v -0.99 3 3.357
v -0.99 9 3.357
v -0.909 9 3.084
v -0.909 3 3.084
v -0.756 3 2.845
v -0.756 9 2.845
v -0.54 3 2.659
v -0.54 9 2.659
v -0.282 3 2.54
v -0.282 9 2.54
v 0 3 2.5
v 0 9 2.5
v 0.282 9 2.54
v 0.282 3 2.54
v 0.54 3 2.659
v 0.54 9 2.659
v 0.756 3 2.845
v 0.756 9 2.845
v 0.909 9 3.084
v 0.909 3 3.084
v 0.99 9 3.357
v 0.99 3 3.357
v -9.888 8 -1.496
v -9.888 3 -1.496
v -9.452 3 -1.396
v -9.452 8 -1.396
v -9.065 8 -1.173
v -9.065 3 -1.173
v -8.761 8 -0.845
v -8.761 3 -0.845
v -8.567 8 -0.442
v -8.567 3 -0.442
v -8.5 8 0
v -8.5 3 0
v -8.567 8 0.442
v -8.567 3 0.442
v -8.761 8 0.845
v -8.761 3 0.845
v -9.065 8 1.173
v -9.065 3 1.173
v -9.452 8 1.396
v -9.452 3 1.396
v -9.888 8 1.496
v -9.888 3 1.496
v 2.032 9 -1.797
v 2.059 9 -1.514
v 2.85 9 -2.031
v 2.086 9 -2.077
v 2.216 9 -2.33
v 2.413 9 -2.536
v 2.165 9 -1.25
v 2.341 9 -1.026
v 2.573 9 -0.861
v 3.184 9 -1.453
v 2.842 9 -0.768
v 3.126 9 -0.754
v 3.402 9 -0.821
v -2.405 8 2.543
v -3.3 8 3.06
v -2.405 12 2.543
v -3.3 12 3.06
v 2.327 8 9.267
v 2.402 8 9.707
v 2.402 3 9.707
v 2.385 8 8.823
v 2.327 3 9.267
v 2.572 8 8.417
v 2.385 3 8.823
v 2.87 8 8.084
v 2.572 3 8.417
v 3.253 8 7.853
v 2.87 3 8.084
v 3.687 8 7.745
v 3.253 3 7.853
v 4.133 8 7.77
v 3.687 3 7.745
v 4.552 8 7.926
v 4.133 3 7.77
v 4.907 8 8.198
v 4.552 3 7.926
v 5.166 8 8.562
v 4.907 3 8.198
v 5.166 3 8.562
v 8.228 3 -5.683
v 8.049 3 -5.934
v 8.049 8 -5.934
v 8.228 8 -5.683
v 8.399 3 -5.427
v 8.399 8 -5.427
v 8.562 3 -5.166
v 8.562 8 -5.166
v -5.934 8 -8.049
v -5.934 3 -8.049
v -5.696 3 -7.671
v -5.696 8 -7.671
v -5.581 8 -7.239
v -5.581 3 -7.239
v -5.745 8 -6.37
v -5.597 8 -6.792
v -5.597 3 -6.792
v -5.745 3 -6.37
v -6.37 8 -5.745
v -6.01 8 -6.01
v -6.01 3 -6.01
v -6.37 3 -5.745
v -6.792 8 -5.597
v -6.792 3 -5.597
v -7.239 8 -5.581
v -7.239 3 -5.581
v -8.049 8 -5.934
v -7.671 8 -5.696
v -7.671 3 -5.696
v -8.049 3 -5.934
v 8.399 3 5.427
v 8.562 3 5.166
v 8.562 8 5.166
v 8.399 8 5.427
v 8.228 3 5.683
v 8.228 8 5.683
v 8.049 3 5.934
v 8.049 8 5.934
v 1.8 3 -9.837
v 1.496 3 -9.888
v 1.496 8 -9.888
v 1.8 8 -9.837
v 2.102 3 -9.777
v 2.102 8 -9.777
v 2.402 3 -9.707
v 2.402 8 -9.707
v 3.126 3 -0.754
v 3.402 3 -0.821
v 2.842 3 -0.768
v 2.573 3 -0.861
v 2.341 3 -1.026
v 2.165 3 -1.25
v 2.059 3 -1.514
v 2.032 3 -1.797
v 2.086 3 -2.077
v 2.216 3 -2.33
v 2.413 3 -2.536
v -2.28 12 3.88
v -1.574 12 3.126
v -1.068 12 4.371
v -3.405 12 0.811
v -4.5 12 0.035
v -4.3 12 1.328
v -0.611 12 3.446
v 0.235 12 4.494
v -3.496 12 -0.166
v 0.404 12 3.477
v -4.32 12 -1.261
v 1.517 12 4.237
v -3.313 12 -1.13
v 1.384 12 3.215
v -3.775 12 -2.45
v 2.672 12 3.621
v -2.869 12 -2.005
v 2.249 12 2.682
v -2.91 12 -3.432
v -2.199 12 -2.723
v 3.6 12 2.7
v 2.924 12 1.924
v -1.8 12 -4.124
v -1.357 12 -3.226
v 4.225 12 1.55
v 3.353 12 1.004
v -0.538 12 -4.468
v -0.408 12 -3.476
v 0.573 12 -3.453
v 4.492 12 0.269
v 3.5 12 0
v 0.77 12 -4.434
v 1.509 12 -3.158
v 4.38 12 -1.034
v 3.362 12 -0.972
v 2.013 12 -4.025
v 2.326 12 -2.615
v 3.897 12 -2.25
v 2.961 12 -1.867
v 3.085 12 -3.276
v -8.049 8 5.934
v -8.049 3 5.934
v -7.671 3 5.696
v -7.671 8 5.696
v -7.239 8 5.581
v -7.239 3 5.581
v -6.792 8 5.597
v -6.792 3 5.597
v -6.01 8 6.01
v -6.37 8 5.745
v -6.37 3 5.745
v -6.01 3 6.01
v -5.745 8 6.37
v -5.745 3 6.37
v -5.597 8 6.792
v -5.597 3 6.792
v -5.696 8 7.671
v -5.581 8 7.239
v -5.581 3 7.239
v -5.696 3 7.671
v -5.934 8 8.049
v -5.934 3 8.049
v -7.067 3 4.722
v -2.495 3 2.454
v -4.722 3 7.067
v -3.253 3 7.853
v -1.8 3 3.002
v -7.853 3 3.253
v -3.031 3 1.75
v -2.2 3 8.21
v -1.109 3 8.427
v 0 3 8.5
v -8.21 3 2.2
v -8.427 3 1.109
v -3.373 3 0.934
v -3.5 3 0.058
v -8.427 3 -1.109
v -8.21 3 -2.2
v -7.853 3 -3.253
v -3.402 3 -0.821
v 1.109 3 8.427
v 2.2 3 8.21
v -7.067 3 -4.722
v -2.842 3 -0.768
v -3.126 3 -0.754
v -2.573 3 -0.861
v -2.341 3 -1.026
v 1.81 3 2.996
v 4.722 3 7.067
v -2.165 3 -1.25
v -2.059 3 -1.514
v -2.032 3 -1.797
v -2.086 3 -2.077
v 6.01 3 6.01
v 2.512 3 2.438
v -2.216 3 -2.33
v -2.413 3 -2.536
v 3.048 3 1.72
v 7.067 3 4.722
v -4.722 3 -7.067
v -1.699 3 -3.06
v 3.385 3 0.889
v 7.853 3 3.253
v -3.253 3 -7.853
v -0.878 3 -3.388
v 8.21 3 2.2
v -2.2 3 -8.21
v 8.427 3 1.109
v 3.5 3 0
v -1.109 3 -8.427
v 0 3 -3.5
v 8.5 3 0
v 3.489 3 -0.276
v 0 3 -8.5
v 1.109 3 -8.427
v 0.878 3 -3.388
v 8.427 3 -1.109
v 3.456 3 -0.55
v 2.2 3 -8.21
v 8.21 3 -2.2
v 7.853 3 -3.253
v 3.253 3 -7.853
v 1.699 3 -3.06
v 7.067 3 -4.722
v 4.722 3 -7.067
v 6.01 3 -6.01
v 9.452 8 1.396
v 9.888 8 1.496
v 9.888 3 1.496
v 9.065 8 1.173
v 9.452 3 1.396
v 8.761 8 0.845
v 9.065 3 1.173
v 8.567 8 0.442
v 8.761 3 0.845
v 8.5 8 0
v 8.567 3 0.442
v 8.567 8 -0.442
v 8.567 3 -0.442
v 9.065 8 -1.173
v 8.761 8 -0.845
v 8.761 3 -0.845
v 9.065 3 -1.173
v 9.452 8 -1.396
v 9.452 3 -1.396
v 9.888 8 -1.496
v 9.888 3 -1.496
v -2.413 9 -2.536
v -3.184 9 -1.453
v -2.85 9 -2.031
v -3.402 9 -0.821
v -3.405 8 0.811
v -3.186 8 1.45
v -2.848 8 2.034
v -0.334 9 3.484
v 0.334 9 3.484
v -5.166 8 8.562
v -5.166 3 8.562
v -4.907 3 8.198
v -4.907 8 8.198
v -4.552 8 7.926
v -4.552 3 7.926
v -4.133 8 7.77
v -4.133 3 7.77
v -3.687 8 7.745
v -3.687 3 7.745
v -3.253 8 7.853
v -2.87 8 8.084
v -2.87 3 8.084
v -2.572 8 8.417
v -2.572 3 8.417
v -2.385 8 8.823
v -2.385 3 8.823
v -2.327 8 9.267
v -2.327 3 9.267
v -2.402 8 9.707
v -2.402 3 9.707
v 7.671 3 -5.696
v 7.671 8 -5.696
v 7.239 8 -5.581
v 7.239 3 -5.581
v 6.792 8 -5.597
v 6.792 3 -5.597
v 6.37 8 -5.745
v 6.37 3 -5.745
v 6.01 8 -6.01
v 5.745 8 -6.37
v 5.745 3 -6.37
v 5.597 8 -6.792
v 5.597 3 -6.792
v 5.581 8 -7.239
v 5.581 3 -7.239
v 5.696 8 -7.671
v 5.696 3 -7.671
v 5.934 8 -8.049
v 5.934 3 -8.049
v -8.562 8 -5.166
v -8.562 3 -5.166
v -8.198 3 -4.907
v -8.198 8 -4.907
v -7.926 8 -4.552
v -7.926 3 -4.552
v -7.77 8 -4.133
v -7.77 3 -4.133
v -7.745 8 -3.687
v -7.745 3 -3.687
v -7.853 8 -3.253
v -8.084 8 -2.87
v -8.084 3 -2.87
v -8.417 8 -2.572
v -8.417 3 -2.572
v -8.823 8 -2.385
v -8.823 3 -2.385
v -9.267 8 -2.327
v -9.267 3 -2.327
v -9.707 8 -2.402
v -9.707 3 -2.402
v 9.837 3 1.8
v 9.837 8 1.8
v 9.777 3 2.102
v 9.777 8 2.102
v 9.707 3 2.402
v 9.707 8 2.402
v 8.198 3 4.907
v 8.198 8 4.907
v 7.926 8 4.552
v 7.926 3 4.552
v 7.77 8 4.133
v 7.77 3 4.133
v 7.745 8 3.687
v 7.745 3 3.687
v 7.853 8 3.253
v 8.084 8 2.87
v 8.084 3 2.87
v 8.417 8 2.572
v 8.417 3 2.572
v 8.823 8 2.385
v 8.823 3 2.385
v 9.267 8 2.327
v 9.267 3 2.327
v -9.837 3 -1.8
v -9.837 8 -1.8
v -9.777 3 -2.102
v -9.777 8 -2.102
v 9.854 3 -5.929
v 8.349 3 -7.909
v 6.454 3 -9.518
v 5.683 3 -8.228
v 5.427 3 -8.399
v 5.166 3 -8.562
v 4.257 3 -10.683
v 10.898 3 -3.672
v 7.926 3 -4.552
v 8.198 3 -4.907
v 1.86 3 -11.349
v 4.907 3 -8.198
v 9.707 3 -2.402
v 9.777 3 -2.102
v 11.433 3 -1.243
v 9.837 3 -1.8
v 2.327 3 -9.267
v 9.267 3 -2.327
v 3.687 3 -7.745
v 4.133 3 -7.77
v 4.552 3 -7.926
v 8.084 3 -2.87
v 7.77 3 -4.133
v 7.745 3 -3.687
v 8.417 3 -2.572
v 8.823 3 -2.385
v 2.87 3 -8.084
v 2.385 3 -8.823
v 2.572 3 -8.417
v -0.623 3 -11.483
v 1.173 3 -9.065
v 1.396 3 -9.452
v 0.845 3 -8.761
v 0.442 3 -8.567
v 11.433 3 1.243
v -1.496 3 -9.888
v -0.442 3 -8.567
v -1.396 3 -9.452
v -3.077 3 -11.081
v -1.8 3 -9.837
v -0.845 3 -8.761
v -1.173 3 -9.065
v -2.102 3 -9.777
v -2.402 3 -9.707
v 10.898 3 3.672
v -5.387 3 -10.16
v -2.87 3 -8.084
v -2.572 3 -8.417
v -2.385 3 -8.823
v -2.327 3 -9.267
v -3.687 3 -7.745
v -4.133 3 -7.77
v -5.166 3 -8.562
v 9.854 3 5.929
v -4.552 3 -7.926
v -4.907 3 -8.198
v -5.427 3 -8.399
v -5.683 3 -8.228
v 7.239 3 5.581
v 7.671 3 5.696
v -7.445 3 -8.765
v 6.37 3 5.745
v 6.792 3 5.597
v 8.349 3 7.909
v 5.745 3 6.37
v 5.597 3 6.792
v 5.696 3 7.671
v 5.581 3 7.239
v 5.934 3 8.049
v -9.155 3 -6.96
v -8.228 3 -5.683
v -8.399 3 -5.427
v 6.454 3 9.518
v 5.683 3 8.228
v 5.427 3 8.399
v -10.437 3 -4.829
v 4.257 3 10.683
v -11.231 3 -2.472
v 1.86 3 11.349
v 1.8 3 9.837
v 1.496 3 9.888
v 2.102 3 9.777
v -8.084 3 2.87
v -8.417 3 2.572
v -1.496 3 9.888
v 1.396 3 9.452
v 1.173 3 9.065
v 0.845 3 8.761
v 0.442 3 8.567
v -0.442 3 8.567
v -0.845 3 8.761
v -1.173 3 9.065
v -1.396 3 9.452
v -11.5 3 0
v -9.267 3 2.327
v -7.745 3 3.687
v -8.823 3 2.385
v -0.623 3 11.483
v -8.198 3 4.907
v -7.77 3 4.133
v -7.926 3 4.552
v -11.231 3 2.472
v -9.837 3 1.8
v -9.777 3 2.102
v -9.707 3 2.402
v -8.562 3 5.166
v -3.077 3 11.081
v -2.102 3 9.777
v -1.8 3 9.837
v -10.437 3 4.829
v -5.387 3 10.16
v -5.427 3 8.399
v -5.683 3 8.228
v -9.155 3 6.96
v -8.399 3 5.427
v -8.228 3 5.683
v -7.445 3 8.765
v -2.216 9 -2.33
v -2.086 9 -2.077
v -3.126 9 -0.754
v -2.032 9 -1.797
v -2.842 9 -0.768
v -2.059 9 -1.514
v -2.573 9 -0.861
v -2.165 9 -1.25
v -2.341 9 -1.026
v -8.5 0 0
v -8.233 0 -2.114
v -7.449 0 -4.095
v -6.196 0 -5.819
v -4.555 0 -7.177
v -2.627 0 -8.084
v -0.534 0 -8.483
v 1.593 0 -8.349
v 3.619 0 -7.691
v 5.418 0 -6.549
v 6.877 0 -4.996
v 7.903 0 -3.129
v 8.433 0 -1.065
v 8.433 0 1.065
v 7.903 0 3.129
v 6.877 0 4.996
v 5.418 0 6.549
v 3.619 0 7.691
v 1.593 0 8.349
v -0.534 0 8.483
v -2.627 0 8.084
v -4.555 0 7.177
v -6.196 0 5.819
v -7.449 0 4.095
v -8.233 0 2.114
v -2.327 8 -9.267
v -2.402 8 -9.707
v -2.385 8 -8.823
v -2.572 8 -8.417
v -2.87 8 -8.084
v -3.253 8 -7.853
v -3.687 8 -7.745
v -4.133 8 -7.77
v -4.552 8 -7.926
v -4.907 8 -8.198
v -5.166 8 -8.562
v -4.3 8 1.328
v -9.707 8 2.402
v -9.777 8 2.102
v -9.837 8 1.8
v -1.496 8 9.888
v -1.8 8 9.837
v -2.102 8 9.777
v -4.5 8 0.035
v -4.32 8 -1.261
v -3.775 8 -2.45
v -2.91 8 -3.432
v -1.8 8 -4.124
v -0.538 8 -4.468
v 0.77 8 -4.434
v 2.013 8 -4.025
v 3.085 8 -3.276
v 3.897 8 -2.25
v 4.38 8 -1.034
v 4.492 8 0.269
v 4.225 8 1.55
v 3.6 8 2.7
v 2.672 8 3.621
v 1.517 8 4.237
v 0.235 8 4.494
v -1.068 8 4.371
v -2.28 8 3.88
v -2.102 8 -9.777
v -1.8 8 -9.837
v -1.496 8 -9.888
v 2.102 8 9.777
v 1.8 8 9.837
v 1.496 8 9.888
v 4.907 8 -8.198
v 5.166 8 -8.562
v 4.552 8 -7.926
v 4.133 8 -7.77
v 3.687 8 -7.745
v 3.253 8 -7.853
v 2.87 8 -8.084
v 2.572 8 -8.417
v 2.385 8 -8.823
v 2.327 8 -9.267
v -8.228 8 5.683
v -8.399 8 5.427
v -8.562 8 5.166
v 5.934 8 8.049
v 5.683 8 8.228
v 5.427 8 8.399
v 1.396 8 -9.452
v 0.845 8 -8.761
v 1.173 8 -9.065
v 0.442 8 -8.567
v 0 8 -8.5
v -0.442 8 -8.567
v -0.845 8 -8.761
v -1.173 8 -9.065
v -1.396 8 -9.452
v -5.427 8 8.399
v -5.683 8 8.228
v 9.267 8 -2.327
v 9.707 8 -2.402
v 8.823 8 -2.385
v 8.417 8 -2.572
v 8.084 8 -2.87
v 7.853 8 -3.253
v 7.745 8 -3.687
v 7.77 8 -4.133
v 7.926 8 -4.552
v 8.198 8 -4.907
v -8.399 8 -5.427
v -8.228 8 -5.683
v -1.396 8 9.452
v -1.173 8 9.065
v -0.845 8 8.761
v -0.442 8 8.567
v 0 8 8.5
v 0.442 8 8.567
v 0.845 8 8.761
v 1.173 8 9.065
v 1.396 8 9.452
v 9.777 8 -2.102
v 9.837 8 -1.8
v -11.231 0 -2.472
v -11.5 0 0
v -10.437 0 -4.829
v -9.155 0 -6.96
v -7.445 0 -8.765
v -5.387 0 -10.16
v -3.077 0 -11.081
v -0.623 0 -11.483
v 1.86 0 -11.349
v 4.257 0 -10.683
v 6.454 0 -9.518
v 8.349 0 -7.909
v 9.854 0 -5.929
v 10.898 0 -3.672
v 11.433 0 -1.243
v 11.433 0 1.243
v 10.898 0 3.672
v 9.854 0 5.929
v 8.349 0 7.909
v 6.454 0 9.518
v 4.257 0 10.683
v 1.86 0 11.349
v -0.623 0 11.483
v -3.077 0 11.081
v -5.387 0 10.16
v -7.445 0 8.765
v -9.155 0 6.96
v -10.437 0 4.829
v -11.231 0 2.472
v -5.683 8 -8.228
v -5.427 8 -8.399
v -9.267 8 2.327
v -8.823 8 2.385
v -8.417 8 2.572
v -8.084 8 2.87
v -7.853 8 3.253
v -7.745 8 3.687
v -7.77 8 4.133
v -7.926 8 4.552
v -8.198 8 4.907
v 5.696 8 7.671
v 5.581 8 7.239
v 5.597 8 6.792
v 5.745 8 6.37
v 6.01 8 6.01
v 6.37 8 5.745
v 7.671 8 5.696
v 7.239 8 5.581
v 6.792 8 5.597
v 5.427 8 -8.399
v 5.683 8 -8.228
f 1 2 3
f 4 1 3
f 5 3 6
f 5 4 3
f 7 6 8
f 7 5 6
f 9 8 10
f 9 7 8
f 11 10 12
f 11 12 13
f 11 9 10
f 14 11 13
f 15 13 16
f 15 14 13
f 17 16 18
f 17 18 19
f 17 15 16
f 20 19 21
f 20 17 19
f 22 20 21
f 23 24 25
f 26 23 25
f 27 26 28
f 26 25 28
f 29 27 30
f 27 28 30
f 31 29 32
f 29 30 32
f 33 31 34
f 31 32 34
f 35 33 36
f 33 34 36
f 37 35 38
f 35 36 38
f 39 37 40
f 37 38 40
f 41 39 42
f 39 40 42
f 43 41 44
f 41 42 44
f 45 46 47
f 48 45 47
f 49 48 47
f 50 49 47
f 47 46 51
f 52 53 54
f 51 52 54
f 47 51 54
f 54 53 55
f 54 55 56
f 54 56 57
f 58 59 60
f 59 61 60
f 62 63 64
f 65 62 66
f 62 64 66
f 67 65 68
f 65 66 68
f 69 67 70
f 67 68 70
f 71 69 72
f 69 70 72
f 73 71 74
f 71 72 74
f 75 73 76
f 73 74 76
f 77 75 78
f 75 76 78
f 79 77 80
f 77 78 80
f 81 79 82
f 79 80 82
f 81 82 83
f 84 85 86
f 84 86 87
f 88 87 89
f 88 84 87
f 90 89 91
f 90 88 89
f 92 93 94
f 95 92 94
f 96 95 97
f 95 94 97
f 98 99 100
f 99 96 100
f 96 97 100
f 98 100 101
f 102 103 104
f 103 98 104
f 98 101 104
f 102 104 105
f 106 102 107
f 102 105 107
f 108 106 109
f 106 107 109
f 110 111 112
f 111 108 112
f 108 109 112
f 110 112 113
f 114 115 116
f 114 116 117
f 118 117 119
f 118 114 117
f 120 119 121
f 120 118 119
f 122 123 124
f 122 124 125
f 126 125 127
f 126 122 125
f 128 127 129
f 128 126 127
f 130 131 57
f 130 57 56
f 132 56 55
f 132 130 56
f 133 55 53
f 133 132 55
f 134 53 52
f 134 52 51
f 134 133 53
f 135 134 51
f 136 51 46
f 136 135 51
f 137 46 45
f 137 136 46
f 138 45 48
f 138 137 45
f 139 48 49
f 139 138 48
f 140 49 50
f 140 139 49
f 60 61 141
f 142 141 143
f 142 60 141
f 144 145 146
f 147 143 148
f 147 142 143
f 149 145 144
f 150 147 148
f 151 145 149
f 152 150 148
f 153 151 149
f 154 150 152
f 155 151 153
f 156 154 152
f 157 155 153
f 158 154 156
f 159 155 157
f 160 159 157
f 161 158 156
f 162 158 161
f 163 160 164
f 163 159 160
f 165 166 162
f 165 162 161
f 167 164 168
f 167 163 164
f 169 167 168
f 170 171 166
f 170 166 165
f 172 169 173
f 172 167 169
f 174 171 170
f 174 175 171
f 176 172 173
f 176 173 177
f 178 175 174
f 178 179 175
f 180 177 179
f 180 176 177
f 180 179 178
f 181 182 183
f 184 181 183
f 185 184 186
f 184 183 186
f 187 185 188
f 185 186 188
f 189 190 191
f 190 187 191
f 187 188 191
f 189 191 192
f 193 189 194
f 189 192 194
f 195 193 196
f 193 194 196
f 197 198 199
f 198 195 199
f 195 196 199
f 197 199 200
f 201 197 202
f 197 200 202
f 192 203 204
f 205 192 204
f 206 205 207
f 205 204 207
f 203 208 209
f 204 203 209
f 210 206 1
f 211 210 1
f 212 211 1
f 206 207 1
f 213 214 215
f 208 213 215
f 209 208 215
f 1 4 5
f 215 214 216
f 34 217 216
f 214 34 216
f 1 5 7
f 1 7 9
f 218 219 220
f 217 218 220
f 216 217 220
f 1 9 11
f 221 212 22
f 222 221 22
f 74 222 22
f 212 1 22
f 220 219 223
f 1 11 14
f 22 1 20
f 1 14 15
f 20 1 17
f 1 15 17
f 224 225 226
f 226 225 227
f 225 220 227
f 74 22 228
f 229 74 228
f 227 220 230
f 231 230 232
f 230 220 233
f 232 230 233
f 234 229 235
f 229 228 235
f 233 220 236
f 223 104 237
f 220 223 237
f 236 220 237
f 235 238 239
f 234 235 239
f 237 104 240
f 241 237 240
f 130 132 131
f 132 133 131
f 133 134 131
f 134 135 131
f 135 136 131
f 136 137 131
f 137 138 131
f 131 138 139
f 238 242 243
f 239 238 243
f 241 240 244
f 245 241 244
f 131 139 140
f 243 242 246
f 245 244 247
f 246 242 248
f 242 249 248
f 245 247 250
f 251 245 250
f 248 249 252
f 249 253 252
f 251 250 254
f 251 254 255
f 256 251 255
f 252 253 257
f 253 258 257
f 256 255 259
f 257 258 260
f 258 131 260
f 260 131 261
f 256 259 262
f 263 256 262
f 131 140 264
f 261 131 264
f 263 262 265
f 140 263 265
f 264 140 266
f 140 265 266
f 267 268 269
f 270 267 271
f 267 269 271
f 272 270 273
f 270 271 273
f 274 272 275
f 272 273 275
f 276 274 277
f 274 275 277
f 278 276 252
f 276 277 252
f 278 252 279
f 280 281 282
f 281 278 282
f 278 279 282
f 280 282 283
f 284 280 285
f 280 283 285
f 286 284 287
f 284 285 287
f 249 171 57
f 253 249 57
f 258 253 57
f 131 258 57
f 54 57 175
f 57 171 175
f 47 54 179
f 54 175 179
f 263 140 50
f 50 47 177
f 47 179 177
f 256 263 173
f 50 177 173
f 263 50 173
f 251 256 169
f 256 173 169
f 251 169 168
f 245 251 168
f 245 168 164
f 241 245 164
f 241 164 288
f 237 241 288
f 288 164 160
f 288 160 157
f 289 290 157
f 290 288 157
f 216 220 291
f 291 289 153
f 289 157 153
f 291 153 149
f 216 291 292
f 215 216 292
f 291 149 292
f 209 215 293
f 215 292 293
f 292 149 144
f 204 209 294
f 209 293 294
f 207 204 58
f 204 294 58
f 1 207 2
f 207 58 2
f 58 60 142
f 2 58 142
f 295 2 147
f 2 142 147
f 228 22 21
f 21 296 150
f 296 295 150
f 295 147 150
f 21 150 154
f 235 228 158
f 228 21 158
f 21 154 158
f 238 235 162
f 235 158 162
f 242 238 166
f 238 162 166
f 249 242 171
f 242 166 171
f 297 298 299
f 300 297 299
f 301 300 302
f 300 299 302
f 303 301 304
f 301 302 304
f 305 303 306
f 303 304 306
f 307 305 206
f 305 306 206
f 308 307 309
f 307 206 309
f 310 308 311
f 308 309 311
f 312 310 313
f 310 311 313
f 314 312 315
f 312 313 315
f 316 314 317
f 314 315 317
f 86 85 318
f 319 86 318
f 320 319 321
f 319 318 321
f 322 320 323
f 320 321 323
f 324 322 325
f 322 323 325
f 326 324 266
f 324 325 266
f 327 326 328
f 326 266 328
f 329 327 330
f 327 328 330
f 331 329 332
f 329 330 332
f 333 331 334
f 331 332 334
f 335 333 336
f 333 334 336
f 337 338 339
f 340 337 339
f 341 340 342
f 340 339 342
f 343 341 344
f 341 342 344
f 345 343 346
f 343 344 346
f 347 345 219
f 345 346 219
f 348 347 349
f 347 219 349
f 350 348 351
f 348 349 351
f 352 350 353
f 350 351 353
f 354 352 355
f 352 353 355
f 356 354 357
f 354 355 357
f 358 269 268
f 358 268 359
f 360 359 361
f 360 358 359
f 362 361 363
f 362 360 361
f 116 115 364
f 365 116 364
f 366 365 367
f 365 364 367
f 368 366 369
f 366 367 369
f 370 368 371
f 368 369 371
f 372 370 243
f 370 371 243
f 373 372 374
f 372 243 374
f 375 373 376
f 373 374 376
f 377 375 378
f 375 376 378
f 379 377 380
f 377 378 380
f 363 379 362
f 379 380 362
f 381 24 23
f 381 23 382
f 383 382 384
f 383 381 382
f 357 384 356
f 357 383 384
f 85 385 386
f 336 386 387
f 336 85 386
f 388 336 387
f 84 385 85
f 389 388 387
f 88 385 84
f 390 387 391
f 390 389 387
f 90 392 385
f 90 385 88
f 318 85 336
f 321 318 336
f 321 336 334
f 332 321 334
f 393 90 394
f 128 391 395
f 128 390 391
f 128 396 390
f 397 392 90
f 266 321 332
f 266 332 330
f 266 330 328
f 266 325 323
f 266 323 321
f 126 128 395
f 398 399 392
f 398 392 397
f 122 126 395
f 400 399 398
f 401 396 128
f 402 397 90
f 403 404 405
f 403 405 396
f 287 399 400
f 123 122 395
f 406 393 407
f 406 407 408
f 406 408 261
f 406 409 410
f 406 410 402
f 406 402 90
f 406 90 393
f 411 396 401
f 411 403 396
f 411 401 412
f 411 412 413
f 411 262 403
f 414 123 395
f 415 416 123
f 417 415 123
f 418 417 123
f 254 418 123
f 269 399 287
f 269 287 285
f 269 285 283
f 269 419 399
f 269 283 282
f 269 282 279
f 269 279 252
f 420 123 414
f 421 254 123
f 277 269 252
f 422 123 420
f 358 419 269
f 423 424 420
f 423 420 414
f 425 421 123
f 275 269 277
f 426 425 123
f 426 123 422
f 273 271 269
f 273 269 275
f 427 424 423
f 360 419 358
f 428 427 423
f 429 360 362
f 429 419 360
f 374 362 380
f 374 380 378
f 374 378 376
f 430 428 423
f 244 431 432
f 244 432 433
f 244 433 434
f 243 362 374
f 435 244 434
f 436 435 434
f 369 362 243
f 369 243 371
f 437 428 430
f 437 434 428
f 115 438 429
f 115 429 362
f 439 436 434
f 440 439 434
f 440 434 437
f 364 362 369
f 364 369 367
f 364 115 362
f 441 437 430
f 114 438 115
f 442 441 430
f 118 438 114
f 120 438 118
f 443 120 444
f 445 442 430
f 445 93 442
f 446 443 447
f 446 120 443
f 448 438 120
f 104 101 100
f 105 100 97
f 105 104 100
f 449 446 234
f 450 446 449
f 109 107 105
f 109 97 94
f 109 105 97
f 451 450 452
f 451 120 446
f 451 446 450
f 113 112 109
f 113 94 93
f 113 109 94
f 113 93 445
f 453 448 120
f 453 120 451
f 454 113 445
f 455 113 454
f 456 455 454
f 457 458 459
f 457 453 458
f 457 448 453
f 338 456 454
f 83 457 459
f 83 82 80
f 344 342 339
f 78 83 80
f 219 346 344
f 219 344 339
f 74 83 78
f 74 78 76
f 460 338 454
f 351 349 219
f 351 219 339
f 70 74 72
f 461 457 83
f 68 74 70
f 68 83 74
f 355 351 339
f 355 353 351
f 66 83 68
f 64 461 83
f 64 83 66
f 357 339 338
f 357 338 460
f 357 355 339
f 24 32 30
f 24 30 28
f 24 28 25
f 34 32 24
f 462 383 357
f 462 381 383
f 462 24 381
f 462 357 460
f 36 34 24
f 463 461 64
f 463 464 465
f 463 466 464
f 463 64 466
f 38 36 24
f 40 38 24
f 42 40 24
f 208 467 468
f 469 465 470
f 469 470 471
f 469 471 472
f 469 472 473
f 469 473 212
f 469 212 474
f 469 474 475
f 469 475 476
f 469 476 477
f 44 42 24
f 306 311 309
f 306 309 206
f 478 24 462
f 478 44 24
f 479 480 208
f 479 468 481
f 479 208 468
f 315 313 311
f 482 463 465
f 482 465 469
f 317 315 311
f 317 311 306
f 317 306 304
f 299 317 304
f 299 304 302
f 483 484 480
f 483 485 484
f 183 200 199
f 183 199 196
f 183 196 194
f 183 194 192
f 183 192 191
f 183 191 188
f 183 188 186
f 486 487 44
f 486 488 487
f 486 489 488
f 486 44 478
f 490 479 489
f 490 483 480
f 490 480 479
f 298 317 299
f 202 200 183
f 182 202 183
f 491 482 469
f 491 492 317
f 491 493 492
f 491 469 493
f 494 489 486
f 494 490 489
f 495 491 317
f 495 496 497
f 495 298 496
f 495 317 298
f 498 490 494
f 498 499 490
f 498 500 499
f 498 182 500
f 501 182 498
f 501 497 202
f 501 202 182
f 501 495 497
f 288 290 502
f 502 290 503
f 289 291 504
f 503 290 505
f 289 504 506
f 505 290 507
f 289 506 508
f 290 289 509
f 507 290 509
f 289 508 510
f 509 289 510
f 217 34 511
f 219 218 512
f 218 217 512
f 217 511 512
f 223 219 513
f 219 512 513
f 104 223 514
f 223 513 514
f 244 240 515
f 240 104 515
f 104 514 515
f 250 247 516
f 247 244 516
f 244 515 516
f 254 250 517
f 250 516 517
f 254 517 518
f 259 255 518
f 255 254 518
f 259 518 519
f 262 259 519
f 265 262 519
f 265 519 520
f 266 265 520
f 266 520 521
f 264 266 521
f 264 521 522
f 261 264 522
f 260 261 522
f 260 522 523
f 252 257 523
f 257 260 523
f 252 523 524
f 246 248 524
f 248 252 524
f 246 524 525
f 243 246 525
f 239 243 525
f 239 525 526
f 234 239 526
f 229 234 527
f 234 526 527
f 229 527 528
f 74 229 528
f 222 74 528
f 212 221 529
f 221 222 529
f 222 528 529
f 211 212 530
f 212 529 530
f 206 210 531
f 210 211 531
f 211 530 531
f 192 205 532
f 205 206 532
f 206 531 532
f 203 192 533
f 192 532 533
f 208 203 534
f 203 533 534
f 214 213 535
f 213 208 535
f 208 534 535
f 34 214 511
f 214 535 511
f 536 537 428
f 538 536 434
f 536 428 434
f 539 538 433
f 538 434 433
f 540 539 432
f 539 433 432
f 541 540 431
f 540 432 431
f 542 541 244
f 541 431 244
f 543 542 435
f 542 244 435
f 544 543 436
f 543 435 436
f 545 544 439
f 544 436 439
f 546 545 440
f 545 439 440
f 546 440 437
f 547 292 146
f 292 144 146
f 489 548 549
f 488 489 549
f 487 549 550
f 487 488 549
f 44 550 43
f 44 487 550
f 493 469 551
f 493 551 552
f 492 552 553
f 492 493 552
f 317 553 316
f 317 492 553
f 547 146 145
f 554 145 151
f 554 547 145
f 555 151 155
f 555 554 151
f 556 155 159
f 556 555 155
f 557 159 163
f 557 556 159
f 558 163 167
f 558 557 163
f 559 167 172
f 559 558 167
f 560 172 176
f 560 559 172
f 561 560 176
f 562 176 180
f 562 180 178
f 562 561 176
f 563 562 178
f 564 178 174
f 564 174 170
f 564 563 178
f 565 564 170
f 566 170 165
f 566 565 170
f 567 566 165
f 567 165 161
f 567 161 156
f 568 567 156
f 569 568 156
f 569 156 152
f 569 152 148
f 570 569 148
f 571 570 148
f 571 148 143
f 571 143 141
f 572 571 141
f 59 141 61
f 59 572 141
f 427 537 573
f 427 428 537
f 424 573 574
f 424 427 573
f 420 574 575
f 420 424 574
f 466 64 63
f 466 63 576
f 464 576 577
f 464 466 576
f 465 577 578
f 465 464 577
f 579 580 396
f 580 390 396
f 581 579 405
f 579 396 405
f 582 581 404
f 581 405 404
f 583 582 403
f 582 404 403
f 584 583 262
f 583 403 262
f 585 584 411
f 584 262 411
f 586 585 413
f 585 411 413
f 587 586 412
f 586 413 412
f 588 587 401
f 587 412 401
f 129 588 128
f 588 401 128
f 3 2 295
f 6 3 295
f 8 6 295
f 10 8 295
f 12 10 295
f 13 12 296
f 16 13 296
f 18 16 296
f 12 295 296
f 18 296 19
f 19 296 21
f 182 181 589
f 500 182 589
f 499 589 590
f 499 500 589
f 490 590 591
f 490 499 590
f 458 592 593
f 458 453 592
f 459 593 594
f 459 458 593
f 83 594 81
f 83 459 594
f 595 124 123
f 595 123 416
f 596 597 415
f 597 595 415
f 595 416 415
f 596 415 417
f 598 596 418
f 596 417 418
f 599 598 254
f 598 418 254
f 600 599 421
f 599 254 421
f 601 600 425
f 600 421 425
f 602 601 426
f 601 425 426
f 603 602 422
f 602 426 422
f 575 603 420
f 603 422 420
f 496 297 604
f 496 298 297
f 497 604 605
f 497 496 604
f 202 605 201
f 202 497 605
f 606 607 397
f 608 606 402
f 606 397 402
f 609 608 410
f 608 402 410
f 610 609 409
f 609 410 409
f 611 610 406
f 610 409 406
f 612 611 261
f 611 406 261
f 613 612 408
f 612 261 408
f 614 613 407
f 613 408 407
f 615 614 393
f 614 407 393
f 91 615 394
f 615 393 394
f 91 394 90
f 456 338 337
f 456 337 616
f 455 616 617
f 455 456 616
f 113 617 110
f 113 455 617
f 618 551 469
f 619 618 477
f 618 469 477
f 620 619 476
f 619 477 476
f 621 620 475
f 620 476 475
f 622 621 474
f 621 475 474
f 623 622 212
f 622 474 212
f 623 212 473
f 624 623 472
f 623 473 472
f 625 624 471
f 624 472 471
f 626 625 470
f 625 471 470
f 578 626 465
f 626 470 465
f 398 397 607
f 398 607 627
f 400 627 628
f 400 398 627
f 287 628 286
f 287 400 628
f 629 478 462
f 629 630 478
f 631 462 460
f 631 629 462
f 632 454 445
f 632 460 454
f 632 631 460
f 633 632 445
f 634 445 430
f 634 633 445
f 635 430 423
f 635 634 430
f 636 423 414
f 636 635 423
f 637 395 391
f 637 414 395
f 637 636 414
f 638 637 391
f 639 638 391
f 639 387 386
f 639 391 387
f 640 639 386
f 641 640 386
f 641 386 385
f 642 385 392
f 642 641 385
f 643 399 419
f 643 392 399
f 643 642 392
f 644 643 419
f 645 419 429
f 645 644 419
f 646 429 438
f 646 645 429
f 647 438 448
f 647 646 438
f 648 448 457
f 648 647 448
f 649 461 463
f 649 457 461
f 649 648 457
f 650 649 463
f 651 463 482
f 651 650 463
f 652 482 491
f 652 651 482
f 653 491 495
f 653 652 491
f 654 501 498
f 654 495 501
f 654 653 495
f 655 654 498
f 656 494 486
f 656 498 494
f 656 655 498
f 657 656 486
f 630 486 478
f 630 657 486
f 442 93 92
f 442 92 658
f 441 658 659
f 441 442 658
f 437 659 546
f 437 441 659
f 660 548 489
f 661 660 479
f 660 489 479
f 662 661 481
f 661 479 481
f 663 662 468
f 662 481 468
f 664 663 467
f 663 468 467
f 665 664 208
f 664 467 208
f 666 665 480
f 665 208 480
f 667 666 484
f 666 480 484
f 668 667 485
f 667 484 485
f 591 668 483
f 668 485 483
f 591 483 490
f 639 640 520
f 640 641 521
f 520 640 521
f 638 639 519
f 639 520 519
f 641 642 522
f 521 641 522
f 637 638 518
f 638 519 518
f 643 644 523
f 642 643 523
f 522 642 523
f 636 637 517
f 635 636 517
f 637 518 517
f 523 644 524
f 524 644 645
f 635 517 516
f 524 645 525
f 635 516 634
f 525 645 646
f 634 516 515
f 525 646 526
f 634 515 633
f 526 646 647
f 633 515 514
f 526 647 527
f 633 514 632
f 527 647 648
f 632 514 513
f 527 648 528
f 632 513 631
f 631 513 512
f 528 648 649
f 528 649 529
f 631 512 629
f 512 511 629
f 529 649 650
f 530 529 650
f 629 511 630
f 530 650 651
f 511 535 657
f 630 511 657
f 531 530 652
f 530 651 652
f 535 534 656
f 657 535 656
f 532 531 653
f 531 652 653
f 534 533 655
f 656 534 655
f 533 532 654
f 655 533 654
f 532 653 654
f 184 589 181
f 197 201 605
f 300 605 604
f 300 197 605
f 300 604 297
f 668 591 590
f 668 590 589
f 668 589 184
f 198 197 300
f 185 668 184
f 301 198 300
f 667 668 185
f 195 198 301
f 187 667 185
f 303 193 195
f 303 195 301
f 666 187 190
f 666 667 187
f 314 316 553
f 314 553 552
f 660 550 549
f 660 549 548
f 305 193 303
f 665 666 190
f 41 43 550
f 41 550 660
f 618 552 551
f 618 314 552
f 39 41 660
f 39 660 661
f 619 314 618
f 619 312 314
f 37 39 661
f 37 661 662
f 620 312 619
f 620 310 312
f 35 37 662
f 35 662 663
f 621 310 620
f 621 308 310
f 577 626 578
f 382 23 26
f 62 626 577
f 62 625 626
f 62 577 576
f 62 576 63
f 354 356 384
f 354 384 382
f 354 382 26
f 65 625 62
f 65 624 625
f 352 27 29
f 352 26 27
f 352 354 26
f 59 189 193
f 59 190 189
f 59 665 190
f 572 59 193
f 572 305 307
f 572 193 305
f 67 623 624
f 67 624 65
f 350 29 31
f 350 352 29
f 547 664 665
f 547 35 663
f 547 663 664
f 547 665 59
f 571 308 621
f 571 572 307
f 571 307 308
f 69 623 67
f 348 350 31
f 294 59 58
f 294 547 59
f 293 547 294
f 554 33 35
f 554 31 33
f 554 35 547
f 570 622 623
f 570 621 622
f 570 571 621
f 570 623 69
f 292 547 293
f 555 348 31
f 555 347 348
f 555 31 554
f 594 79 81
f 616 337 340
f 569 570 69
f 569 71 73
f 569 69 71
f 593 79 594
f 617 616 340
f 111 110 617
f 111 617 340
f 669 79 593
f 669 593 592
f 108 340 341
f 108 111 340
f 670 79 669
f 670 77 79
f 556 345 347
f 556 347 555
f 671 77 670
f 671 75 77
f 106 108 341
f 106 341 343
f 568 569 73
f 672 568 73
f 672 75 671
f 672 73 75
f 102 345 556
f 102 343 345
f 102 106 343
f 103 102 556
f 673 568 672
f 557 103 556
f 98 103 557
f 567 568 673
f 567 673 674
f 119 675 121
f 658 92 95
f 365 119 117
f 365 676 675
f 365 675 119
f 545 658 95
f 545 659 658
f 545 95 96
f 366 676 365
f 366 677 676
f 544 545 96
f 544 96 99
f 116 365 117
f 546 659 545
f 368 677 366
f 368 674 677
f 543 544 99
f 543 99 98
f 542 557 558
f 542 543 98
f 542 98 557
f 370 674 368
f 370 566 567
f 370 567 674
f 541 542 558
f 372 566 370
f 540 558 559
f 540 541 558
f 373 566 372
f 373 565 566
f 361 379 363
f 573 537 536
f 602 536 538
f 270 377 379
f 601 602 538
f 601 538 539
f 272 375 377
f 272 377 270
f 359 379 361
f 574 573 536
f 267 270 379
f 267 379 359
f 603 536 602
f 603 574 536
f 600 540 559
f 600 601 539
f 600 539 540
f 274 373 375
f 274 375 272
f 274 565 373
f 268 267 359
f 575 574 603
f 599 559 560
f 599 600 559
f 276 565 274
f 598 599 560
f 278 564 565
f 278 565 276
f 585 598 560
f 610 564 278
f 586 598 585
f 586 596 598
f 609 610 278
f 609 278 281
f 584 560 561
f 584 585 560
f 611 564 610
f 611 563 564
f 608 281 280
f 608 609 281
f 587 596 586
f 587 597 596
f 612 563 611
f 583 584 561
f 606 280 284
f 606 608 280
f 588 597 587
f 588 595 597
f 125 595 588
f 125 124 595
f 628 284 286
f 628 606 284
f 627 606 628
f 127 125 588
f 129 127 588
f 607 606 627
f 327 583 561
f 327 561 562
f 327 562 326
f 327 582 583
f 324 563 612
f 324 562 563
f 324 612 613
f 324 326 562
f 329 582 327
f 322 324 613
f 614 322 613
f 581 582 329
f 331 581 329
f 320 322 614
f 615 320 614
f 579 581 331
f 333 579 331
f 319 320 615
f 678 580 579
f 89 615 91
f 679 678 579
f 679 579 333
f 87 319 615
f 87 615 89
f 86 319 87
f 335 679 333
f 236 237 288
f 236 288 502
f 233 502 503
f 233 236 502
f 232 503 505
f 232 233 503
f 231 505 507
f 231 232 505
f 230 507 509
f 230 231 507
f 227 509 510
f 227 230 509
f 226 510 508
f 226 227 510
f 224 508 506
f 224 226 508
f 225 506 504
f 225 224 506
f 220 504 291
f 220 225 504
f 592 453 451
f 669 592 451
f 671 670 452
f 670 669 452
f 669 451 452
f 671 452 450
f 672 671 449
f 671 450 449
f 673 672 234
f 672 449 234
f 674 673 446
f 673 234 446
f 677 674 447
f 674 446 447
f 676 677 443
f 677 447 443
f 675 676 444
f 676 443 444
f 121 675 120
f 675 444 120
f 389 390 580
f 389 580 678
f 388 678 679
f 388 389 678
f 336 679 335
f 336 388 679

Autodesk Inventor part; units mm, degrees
ref_plane "YZ Plane" through (0, 0, 0) normal (1, 0, 0) x (0, 1, 0)
ref_plane "XZ Plane" through (0, 0, 0) normal (0, 1, 0) x (-1, 0, 0)
ref_plane "XY Plane" through (0, 0, 0) normal (0, 0, 1) x (1, 0, 0)
sketch "Эскиз1" plane through (0, 0, 0) normal (0, 1, 0) x (-1, 0, 0)
  circle A0 centre (0, 0) radius 11.5
  circle A1 centre (0, 0) radius 8.5
  dimension "d0" = 23
  dimension "d1" = 17
extrude "Выдавливание1" add sketch "Эскиз1" along normal blind 3
sketch "Эскиз2" plane through (0, 3, 0) normal (0, 1, 0) x (1, 0, 0)
  circle A0 centre (0, 0) radius 10
  circle A1 centre (-10, 0) radius 1.5
  circle A2 centre (-9.2388, -3.8268) radius 1.5
  circle A3 centre (-7.0711, -7.0711) radius 1.5
  circle A4 centre (-3.8268, -9.2388) radius 1.5
  circle A5 centre (0, -10) radius 1.5
  circle A6 centre (3.8268, -9.2388) radius 1.5
  circle A7 centre (7.0711, -7.0711) radius 1.5
  circle A8 centre (9.2388, -3.8268) radius 1.5
  circle A9 centre (10, 0) radius 1.5
  circle A10 centre (9.2388, 3.8268) radius 1.5
  circle A11 centre (7.0711, 7.0711) radius 1.5
  circle A12 centre (3.8268, 9.2388) radius 1.5
  circle A13 centre (0, 10) radius 1.5
  circle A14 centre (-3.8268, 9.2388) radius 1.5
  circle A15 centre (-7.0711, 7.0711) radius 1.5
  circle A16 centre (-9.2388, 3.8268) radius 1.5
  point P0 (-8.5625, 5.1657)
  point P1 (-9.7073, 2.4019)
  point P2 (-9.8875, 1.4958)
  point P3 (-9.8875, -1.4958)
  point P4 (-9.7073, -2.4019)
  point P5 (-8.5625, -5.1657)
  point P6 (-8.0492, -5.9338)
  point P7 (-5.9338, -8.0492)
  point P8 (-5.1657, -8.5625)
  point P9 (-2.4019, -9.7073)
  point P10 (-1.4958, -9.8875)
  point P11 (1.4958, -9.8875)
  point P12 (2.4019, -9.7073)
  point P13 (5.1657, -8.5625)
  point P14 (5.9338, -8.0492)
  point P15 (8.0492, -5.9338)
  point P16 (8.5625, -5.1657)
  point P17 (9.7073, -2.4019)
  point P18 (9.8875, -1.4958)
  point P19 (9.8875, 1.4958)
  point P20 (9.7073, 2.4019)
  point P21 (8.5625, 5.1657)
  point P22 (8.0492, 5.9338)
  point P23 (5.9338, 8.0492)
  point P24 (5.1657, 8.5625)
  point P25 (2.4019, 9.7073)
  point P26 (1.4958, 9.8875)
  point P27 (-1.4958, 9.8875)
  point P28 (-2.4019, 9.7073)
  point P29 (-5.1657, 8.5625)
  point P30 (-5.9338, 8.0492)
  point P31 (-8.0492, 5.9338)
  dimension "d4" = 20
  dimension "d5" = 3
  dimension "d8" = 360
extrude "Выдавливание2" add sketch "Эскиз2" along normal blind 5 contours A9 A0 A8 A7 A6 A5 A4 A3 A2 A1 A16 A15 A14 A13 A12 A11 A10
sketch "Эскиз3" plane through (0, 8, 0) normal (0, 1, 0) x (1, 0, 0)
  circle A0 centre (0, 0) radius 4.5
  circle A1 centre (0, 0) radius 3.5
  dimension "d12" = 9
  dimension "d13" = 7
extrude "Выдавливание3" add sketch "Эскиз3" along normal blind 4
sketch "Эскиз4" plane through (0, 8, 0) normal (0, 1, 0) x (1, 0, 0)
  circle A0 centre (0, 0) radius 3.5
extrude "Выдавливание4" cut sketch "Эскиз4" against normal through all
sketch "Эскиз5" plane through (0, 3, 0) normal (0, -1, 0) x (1, 0, 0)
  circle A0 centre (0, 0) radius 3.5
  circle A1 centre (0, 0) radius 3.5 projected
  circle A2 centre (0, 3.5) radius 1
  circle A3 centre (-3.0311, -1.75) radius 1
  circle A4 centre (3.0311, -1.75) radius 1
  point P0 (-0.9897, 3.3571)
  point P1 (0.9897, 3.3571)
  point P2 (3.4022, -0.8214)
  point P3 (2.4125, -2.5357)
  point P4 (-3.4022, -0.8214)
  point P5 (-2.4125, -2.5357)
  dimension "d18" = 2
  dimension "d21" = 360
extrude "Выдавливание5" add sketch "Эскиз5" against normal blind 6 contours A2 A0 | A0 A4 | A3 A0 picked at (0, 3.156) picked at (2.7332, -1.578) picked at (-2.7274, -1.5885)
sketch "Эскиз6" plane through (0, 12, 0) normal (0, 1, 0) x (1, 0, 0)
  arc A0 (2.4125, 2.5357) -> (3.4022, 0.8214) centre (3.0311, 1.75) ccw projected
  line L0 (0, 0) -> (3.0311, 1.75)
  line L1 (0, 0) -> (-4.9072, -2.8332)
  line L2 (-4.6871, -3.8608) -> (-2.1071, -2.3712)
  line L3 (-2.1071, -2.3712) -> (-3.1071, -0.6392)
  line L4 (-3.1071, -0.6392) -> (-5.6871, -2.1288)
  line L5 (-5.6871, -2.1288) -> (-4.6871, -3.8608)
  circle A1 centre (0, 0) radius 4.5 projected
  line L6 (-4.6871, -3.8608) -> (-3.1071, -0.6392) construction
  line L7 (-2.1071, -2.3712) -> (-5.6871, -2.1288) construction
  point P0 (-3.8971, -2.25)
  dimension "d25" = 2
extrude "Выдавливание6" cut sketch "Эскиз6" against normal blind 4 contours L3 L2 A1 L1 | L1 A1 L4 L3 | A1 L2 L5 L4
properties part number "вращалка"
